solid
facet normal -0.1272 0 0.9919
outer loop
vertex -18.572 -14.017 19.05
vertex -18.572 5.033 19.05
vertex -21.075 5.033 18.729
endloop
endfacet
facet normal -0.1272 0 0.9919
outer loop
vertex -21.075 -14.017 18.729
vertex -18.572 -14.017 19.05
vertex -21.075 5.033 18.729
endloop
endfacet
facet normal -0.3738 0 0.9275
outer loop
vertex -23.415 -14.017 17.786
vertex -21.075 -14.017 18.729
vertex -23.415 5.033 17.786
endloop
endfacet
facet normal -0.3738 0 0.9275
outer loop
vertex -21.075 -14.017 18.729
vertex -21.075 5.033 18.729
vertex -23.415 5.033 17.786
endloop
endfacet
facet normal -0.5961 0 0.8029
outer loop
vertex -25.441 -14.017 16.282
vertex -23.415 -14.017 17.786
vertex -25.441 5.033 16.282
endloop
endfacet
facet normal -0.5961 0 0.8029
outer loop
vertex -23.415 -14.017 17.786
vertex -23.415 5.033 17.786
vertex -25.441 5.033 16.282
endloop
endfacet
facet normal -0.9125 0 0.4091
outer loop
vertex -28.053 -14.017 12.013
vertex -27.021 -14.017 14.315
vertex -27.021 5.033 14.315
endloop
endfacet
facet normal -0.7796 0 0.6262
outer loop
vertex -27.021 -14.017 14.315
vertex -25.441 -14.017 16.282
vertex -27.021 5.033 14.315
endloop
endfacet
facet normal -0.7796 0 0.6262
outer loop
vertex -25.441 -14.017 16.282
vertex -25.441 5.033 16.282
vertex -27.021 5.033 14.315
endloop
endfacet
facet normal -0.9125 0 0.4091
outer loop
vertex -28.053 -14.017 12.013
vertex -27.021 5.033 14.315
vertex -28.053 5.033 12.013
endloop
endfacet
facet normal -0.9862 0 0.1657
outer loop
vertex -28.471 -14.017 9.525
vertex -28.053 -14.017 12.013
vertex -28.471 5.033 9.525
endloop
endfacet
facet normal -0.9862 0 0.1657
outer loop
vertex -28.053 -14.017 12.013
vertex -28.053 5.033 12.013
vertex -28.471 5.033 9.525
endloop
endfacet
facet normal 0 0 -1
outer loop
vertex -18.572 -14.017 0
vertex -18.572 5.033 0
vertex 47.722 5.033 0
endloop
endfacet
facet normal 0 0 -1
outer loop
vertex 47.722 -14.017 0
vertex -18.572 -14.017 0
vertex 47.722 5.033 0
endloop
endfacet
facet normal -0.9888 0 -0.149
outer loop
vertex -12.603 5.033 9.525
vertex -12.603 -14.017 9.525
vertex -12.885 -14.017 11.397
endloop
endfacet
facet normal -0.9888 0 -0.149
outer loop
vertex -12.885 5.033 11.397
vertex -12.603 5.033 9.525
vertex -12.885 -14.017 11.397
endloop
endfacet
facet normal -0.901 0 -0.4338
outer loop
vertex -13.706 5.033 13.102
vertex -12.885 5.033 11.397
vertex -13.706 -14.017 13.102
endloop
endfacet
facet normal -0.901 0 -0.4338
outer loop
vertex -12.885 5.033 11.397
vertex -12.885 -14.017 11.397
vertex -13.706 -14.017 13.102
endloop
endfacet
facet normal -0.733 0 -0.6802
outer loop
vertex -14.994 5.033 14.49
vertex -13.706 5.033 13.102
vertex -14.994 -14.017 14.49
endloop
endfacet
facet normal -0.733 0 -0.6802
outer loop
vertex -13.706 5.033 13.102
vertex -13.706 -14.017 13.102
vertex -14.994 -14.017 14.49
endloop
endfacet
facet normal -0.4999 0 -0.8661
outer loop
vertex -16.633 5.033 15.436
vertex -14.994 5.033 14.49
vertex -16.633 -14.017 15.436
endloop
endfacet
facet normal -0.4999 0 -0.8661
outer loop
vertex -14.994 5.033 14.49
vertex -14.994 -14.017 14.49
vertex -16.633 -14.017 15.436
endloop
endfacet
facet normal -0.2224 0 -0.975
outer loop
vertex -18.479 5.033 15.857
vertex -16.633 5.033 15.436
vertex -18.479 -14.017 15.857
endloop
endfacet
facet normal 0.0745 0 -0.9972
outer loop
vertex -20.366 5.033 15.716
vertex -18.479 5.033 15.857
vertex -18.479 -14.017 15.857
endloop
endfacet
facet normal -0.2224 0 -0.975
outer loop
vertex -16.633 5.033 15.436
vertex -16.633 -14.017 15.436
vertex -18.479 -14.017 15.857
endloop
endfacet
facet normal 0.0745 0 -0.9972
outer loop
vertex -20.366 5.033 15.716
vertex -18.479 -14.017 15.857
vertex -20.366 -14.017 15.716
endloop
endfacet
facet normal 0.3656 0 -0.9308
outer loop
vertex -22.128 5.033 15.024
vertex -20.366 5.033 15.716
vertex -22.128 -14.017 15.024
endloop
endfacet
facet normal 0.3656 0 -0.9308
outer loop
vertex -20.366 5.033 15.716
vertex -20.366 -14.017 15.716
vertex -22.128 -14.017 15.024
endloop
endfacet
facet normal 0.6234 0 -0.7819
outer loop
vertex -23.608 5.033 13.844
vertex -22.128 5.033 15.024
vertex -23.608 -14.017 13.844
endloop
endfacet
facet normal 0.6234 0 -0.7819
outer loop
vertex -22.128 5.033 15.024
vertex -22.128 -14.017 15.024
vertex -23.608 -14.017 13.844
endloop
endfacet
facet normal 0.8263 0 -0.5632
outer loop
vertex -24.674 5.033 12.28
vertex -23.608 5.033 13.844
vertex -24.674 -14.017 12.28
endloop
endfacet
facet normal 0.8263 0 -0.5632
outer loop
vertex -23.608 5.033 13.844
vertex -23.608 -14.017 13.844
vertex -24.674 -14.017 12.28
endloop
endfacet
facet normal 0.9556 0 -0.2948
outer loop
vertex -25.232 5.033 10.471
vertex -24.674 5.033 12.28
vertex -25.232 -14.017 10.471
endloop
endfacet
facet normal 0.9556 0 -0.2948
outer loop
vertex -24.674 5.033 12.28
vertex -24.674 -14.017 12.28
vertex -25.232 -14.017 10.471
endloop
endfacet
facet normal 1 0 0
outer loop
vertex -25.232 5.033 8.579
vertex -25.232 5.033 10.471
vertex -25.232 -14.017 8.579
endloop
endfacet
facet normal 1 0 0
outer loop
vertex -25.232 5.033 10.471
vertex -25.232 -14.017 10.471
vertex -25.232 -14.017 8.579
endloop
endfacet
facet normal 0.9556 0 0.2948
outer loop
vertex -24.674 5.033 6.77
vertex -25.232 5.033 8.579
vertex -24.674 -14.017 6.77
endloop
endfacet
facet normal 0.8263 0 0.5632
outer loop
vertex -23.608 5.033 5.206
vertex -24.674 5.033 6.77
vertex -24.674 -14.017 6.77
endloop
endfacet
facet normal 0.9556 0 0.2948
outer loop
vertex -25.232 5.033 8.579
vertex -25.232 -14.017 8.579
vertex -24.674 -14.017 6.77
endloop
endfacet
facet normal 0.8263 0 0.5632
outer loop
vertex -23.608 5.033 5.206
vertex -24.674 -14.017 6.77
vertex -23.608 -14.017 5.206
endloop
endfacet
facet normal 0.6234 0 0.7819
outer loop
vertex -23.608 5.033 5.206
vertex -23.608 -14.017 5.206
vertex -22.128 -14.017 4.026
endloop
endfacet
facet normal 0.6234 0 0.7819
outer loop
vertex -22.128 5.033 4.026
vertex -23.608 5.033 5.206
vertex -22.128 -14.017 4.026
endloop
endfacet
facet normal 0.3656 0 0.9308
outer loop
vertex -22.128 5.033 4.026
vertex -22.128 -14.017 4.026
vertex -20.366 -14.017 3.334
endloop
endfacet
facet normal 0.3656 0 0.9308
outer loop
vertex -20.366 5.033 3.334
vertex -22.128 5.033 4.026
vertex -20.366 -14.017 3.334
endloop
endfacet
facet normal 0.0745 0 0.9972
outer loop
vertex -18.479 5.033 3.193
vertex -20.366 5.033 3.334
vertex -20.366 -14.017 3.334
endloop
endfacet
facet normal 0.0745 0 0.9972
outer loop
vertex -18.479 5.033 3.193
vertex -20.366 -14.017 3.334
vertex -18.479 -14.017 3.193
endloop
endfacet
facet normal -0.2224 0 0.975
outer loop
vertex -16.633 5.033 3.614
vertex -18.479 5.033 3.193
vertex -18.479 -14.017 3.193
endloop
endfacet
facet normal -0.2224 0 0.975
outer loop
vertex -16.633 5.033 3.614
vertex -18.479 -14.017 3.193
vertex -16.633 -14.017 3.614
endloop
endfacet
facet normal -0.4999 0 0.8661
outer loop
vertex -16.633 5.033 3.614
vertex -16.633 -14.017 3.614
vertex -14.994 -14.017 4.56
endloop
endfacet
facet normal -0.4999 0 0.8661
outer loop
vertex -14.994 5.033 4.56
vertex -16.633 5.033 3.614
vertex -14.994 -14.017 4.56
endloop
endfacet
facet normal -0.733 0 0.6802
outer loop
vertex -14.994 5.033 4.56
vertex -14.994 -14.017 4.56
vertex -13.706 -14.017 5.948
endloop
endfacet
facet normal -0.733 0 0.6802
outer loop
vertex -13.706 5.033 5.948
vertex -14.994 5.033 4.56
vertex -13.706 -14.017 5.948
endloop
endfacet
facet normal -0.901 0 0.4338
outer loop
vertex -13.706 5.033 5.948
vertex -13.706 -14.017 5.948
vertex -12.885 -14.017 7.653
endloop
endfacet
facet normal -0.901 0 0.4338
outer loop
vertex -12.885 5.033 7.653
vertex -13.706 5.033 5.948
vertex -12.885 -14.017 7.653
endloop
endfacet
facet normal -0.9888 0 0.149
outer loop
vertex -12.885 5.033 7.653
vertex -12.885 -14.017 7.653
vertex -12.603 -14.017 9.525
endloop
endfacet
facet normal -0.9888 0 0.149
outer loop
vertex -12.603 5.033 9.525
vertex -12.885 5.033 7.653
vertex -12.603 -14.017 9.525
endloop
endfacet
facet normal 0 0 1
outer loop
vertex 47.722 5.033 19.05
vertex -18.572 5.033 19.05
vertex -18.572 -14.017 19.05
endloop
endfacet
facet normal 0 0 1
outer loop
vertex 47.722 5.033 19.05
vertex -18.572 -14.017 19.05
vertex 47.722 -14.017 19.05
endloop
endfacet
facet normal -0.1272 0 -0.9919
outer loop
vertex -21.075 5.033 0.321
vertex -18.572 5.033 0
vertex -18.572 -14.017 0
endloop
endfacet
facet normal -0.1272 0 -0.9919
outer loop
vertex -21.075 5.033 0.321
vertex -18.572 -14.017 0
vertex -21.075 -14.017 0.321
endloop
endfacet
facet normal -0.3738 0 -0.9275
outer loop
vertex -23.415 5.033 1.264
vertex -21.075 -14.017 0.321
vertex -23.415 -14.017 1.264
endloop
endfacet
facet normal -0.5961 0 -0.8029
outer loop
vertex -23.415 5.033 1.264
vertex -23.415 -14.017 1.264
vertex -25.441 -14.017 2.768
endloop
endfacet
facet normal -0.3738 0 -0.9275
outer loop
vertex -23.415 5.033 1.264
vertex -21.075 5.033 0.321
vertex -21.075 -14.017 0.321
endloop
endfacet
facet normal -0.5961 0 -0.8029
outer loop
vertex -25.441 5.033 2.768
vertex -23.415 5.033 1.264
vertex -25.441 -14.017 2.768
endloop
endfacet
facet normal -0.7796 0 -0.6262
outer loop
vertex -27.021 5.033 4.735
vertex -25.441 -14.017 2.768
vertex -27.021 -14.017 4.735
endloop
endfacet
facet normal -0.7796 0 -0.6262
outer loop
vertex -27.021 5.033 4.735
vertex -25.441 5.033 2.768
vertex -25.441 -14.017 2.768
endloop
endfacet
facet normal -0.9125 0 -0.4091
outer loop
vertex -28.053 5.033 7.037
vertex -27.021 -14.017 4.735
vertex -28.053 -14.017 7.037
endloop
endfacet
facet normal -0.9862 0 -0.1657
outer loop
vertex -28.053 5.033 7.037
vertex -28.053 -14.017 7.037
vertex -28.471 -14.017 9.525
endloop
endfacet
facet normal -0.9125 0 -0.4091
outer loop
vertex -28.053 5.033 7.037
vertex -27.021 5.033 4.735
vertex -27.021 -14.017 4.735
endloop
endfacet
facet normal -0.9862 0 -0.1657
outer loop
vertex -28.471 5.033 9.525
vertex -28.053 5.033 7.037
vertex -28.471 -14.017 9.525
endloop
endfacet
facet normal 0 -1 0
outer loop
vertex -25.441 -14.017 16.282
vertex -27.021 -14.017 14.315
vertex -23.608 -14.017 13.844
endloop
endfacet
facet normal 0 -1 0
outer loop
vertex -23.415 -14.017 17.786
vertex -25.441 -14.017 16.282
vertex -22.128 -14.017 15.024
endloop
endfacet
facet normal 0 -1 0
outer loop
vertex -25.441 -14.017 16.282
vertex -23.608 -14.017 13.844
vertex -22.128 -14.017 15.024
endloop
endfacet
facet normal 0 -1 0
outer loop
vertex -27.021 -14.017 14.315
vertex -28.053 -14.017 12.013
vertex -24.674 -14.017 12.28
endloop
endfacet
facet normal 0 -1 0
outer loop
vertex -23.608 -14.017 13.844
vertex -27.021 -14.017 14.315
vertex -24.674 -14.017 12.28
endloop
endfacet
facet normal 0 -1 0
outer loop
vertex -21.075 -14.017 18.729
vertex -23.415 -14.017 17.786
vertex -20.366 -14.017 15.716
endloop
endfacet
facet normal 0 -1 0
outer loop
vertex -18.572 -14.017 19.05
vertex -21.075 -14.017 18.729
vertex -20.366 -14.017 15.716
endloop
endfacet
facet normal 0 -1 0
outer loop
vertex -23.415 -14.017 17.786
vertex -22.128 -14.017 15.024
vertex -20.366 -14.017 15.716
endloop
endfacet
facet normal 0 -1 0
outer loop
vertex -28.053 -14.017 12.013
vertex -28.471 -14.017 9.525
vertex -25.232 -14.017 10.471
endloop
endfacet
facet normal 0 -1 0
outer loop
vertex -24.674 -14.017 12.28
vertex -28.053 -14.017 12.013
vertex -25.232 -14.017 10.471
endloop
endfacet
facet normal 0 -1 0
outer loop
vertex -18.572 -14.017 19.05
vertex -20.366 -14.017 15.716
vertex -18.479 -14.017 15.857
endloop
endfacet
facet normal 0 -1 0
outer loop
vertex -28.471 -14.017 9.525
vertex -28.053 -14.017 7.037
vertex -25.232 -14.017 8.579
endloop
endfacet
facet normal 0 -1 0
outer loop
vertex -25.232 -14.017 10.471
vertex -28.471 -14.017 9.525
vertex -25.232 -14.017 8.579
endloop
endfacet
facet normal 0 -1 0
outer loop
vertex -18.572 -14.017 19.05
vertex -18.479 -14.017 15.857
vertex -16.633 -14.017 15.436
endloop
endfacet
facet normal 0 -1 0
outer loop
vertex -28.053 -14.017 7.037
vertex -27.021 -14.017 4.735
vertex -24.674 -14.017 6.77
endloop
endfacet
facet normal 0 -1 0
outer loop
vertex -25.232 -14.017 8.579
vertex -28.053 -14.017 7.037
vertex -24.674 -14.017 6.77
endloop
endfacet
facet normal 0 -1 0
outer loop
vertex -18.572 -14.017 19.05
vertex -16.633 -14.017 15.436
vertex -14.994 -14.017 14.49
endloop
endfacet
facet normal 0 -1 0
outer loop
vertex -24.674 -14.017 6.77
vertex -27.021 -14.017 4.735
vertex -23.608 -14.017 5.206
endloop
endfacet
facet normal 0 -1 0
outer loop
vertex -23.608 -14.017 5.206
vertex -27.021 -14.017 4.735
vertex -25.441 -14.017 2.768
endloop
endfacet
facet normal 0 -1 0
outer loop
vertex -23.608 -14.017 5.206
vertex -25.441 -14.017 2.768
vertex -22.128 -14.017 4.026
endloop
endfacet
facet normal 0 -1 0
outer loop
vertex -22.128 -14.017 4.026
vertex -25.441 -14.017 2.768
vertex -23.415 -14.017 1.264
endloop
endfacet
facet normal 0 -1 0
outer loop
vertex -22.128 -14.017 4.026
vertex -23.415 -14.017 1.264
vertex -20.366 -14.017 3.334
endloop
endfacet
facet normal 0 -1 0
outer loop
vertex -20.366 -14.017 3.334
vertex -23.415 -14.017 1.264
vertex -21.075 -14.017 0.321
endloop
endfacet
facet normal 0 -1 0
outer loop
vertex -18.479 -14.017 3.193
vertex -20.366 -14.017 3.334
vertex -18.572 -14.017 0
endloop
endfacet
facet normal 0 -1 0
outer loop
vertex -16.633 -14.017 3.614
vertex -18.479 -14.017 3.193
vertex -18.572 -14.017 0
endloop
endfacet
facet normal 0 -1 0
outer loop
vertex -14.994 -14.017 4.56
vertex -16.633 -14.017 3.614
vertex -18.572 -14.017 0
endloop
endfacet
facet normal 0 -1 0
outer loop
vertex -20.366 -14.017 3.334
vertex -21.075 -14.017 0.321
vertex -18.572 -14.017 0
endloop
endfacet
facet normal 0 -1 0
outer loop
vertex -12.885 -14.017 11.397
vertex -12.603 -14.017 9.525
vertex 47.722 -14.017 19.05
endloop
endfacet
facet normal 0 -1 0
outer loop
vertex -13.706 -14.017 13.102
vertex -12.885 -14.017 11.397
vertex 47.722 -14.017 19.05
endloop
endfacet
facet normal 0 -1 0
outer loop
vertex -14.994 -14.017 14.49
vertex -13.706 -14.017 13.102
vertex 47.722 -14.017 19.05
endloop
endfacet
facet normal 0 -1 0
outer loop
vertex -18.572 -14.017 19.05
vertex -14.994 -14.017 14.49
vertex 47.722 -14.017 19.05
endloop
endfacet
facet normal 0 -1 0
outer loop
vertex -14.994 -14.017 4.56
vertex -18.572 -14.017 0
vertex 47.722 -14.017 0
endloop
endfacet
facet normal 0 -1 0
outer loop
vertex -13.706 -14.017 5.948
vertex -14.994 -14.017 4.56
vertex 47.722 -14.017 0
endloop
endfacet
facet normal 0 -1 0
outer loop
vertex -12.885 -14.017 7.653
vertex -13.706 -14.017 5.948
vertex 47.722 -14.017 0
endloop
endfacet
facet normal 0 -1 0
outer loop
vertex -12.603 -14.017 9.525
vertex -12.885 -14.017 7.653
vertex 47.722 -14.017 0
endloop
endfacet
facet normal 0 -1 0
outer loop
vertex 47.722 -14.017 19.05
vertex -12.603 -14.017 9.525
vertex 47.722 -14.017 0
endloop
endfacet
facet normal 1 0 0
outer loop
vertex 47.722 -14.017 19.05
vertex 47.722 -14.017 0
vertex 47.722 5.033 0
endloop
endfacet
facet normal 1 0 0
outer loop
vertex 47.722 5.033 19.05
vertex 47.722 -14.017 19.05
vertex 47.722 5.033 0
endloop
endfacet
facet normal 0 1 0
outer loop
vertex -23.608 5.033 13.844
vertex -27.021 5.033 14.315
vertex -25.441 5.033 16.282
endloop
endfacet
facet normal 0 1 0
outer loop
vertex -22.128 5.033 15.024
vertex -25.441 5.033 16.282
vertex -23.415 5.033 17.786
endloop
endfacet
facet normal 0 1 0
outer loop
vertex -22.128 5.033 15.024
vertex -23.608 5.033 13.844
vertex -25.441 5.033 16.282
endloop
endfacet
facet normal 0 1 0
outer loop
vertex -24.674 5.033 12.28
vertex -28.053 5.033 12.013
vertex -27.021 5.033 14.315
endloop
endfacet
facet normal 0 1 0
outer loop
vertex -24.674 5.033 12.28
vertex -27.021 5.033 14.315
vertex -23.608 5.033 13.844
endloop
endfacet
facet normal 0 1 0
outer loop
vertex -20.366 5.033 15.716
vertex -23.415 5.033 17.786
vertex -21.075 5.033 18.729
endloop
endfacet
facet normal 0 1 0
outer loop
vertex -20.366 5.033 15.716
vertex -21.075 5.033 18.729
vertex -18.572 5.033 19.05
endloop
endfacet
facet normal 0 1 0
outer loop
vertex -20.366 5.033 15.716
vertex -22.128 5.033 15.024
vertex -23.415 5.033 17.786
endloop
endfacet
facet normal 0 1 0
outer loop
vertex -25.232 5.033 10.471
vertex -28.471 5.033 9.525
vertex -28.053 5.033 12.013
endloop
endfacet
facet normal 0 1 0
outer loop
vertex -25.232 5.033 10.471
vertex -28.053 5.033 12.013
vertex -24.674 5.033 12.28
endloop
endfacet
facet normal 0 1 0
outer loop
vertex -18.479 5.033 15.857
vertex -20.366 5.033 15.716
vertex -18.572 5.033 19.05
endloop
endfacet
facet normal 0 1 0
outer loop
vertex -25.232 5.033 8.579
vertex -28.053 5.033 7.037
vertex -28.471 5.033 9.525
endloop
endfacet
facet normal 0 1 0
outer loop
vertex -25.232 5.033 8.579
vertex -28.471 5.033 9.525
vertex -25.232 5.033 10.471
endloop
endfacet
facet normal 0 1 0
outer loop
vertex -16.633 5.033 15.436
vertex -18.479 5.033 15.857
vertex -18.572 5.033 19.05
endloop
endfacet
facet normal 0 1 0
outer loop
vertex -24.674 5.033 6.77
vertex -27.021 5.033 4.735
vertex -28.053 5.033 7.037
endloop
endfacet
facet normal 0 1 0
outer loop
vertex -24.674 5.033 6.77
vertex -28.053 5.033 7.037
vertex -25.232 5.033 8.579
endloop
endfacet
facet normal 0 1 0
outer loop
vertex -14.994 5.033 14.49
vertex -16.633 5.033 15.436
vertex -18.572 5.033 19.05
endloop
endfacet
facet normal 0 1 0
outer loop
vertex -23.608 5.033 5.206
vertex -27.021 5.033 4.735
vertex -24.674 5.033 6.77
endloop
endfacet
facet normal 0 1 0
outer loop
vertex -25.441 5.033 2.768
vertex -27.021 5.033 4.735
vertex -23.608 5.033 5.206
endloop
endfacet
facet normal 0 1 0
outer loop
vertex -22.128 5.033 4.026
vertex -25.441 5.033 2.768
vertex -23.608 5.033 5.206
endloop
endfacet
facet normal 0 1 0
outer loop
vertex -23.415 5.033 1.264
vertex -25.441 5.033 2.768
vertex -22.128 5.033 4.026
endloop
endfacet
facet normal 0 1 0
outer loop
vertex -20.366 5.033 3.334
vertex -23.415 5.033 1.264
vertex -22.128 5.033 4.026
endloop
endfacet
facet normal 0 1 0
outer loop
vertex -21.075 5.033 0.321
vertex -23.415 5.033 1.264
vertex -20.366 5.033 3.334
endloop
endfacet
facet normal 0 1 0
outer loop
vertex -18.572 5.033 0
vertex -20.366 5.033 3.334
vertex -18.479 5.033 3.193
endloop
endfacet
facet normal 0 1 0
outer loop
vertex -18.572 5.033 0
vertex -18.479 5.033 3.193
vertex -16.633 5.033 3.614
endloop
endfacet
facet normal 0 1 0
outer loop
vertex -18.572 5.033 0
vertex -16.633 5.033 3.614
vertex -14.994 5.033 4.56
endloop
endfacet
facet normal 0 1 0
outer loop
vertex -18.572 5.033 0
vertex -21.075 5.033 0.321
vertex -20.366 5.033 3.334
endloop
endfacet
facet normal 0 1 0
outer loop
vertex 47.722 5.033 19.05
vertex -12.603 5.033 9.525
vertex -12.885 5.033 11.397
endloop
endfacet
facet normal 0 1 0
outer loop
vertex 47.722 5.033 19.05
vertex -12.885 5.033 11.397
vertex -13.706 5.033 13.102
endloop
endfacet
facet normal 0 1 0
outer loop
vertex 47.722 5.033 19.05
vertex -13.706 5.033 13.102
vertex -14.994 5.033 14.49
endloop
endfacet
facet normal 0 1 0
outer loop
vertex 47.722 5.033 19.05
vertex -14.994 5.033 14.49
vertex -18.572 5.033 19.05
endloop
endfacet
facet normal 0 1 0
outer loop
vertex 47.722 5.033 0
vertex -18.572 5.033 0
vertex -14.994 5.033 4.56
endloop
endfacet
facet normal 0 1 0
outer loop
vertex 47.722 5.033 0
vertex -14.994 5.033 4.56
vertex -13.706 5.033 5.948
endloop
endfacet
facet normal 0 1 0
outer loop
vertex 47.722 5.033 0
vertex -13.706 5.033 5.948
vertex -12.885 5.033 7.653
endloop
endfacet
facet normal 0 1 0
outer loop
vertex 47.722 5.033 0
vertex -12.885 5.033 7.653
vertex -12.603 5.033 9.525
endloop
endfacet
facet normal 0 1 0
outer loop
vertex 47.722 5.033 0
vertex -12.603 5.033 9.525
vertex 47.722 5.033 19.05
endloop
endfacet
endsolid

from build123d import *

# Parameters (mm, degrees)
F0_W        = 76.2
F0_H        = 19.05
F1_DEPTH    = 19.05
F3_D        = 12.7
F4_T1_DEPTH = 68.58


# Not quite as in the source:
# - a fillet or chamfer that OpenCascade refuses, or shapes differently, is made with other operations: its cross-section is extruded or revolved along the edge and cut away or added


with BuildPart() as f1:
    # F0 (on Top) → F1 (new body)
    with BuildSketch(Plane.XY):
        with Locations((9.6218887268, -4.4917178258)):
            Rectangle(F0_W, F0_H)
    extrude(amount=F1_DEPTH)

    # F3 (through all)
    with Locations(Plane(origin=(0, 5.0332821742, 0), x_dir=(-1, 0, 0), z_dir=(0, 1, 0))):
        with Locations((18.9531112732, 9.525)):
            Hole(F3_D / 2)

    # F4: fillet of radius 9.906 on 2 edges, made by hand

    # F4_s2 → F4_t1 (cut)
    with BuildSketch(Plane.XZ.offset(-29.7982821742)):
        with BuildLine():
            ThreePointArc((-18.5721112732, 19.05), (-25.5767110476, 16.1485997744), (-28.4781112732, 9.144))
            Line((-28.4781112732, 9.144), (-28.4781112732, 19.05))
            Line((-28.4781112732, 19.05), (-18.5721112732, 19.05))
        make_face()
        with BuildLine():
            ThreePointArc((-18.5721112732, 0), (-25.5767110476, 2.9014002256), (-28.4781112732, 9.906))
            Line((-28.4781112732, 9.906), (-28.4781112732, 0))
            Line((-28.4781112732, 0), (-18.5721112732, 0))
        make_face()
    extrude(amount=F4_T1_DEPTH, mode=Mode.SUBTRACT)


solid = f1.part
